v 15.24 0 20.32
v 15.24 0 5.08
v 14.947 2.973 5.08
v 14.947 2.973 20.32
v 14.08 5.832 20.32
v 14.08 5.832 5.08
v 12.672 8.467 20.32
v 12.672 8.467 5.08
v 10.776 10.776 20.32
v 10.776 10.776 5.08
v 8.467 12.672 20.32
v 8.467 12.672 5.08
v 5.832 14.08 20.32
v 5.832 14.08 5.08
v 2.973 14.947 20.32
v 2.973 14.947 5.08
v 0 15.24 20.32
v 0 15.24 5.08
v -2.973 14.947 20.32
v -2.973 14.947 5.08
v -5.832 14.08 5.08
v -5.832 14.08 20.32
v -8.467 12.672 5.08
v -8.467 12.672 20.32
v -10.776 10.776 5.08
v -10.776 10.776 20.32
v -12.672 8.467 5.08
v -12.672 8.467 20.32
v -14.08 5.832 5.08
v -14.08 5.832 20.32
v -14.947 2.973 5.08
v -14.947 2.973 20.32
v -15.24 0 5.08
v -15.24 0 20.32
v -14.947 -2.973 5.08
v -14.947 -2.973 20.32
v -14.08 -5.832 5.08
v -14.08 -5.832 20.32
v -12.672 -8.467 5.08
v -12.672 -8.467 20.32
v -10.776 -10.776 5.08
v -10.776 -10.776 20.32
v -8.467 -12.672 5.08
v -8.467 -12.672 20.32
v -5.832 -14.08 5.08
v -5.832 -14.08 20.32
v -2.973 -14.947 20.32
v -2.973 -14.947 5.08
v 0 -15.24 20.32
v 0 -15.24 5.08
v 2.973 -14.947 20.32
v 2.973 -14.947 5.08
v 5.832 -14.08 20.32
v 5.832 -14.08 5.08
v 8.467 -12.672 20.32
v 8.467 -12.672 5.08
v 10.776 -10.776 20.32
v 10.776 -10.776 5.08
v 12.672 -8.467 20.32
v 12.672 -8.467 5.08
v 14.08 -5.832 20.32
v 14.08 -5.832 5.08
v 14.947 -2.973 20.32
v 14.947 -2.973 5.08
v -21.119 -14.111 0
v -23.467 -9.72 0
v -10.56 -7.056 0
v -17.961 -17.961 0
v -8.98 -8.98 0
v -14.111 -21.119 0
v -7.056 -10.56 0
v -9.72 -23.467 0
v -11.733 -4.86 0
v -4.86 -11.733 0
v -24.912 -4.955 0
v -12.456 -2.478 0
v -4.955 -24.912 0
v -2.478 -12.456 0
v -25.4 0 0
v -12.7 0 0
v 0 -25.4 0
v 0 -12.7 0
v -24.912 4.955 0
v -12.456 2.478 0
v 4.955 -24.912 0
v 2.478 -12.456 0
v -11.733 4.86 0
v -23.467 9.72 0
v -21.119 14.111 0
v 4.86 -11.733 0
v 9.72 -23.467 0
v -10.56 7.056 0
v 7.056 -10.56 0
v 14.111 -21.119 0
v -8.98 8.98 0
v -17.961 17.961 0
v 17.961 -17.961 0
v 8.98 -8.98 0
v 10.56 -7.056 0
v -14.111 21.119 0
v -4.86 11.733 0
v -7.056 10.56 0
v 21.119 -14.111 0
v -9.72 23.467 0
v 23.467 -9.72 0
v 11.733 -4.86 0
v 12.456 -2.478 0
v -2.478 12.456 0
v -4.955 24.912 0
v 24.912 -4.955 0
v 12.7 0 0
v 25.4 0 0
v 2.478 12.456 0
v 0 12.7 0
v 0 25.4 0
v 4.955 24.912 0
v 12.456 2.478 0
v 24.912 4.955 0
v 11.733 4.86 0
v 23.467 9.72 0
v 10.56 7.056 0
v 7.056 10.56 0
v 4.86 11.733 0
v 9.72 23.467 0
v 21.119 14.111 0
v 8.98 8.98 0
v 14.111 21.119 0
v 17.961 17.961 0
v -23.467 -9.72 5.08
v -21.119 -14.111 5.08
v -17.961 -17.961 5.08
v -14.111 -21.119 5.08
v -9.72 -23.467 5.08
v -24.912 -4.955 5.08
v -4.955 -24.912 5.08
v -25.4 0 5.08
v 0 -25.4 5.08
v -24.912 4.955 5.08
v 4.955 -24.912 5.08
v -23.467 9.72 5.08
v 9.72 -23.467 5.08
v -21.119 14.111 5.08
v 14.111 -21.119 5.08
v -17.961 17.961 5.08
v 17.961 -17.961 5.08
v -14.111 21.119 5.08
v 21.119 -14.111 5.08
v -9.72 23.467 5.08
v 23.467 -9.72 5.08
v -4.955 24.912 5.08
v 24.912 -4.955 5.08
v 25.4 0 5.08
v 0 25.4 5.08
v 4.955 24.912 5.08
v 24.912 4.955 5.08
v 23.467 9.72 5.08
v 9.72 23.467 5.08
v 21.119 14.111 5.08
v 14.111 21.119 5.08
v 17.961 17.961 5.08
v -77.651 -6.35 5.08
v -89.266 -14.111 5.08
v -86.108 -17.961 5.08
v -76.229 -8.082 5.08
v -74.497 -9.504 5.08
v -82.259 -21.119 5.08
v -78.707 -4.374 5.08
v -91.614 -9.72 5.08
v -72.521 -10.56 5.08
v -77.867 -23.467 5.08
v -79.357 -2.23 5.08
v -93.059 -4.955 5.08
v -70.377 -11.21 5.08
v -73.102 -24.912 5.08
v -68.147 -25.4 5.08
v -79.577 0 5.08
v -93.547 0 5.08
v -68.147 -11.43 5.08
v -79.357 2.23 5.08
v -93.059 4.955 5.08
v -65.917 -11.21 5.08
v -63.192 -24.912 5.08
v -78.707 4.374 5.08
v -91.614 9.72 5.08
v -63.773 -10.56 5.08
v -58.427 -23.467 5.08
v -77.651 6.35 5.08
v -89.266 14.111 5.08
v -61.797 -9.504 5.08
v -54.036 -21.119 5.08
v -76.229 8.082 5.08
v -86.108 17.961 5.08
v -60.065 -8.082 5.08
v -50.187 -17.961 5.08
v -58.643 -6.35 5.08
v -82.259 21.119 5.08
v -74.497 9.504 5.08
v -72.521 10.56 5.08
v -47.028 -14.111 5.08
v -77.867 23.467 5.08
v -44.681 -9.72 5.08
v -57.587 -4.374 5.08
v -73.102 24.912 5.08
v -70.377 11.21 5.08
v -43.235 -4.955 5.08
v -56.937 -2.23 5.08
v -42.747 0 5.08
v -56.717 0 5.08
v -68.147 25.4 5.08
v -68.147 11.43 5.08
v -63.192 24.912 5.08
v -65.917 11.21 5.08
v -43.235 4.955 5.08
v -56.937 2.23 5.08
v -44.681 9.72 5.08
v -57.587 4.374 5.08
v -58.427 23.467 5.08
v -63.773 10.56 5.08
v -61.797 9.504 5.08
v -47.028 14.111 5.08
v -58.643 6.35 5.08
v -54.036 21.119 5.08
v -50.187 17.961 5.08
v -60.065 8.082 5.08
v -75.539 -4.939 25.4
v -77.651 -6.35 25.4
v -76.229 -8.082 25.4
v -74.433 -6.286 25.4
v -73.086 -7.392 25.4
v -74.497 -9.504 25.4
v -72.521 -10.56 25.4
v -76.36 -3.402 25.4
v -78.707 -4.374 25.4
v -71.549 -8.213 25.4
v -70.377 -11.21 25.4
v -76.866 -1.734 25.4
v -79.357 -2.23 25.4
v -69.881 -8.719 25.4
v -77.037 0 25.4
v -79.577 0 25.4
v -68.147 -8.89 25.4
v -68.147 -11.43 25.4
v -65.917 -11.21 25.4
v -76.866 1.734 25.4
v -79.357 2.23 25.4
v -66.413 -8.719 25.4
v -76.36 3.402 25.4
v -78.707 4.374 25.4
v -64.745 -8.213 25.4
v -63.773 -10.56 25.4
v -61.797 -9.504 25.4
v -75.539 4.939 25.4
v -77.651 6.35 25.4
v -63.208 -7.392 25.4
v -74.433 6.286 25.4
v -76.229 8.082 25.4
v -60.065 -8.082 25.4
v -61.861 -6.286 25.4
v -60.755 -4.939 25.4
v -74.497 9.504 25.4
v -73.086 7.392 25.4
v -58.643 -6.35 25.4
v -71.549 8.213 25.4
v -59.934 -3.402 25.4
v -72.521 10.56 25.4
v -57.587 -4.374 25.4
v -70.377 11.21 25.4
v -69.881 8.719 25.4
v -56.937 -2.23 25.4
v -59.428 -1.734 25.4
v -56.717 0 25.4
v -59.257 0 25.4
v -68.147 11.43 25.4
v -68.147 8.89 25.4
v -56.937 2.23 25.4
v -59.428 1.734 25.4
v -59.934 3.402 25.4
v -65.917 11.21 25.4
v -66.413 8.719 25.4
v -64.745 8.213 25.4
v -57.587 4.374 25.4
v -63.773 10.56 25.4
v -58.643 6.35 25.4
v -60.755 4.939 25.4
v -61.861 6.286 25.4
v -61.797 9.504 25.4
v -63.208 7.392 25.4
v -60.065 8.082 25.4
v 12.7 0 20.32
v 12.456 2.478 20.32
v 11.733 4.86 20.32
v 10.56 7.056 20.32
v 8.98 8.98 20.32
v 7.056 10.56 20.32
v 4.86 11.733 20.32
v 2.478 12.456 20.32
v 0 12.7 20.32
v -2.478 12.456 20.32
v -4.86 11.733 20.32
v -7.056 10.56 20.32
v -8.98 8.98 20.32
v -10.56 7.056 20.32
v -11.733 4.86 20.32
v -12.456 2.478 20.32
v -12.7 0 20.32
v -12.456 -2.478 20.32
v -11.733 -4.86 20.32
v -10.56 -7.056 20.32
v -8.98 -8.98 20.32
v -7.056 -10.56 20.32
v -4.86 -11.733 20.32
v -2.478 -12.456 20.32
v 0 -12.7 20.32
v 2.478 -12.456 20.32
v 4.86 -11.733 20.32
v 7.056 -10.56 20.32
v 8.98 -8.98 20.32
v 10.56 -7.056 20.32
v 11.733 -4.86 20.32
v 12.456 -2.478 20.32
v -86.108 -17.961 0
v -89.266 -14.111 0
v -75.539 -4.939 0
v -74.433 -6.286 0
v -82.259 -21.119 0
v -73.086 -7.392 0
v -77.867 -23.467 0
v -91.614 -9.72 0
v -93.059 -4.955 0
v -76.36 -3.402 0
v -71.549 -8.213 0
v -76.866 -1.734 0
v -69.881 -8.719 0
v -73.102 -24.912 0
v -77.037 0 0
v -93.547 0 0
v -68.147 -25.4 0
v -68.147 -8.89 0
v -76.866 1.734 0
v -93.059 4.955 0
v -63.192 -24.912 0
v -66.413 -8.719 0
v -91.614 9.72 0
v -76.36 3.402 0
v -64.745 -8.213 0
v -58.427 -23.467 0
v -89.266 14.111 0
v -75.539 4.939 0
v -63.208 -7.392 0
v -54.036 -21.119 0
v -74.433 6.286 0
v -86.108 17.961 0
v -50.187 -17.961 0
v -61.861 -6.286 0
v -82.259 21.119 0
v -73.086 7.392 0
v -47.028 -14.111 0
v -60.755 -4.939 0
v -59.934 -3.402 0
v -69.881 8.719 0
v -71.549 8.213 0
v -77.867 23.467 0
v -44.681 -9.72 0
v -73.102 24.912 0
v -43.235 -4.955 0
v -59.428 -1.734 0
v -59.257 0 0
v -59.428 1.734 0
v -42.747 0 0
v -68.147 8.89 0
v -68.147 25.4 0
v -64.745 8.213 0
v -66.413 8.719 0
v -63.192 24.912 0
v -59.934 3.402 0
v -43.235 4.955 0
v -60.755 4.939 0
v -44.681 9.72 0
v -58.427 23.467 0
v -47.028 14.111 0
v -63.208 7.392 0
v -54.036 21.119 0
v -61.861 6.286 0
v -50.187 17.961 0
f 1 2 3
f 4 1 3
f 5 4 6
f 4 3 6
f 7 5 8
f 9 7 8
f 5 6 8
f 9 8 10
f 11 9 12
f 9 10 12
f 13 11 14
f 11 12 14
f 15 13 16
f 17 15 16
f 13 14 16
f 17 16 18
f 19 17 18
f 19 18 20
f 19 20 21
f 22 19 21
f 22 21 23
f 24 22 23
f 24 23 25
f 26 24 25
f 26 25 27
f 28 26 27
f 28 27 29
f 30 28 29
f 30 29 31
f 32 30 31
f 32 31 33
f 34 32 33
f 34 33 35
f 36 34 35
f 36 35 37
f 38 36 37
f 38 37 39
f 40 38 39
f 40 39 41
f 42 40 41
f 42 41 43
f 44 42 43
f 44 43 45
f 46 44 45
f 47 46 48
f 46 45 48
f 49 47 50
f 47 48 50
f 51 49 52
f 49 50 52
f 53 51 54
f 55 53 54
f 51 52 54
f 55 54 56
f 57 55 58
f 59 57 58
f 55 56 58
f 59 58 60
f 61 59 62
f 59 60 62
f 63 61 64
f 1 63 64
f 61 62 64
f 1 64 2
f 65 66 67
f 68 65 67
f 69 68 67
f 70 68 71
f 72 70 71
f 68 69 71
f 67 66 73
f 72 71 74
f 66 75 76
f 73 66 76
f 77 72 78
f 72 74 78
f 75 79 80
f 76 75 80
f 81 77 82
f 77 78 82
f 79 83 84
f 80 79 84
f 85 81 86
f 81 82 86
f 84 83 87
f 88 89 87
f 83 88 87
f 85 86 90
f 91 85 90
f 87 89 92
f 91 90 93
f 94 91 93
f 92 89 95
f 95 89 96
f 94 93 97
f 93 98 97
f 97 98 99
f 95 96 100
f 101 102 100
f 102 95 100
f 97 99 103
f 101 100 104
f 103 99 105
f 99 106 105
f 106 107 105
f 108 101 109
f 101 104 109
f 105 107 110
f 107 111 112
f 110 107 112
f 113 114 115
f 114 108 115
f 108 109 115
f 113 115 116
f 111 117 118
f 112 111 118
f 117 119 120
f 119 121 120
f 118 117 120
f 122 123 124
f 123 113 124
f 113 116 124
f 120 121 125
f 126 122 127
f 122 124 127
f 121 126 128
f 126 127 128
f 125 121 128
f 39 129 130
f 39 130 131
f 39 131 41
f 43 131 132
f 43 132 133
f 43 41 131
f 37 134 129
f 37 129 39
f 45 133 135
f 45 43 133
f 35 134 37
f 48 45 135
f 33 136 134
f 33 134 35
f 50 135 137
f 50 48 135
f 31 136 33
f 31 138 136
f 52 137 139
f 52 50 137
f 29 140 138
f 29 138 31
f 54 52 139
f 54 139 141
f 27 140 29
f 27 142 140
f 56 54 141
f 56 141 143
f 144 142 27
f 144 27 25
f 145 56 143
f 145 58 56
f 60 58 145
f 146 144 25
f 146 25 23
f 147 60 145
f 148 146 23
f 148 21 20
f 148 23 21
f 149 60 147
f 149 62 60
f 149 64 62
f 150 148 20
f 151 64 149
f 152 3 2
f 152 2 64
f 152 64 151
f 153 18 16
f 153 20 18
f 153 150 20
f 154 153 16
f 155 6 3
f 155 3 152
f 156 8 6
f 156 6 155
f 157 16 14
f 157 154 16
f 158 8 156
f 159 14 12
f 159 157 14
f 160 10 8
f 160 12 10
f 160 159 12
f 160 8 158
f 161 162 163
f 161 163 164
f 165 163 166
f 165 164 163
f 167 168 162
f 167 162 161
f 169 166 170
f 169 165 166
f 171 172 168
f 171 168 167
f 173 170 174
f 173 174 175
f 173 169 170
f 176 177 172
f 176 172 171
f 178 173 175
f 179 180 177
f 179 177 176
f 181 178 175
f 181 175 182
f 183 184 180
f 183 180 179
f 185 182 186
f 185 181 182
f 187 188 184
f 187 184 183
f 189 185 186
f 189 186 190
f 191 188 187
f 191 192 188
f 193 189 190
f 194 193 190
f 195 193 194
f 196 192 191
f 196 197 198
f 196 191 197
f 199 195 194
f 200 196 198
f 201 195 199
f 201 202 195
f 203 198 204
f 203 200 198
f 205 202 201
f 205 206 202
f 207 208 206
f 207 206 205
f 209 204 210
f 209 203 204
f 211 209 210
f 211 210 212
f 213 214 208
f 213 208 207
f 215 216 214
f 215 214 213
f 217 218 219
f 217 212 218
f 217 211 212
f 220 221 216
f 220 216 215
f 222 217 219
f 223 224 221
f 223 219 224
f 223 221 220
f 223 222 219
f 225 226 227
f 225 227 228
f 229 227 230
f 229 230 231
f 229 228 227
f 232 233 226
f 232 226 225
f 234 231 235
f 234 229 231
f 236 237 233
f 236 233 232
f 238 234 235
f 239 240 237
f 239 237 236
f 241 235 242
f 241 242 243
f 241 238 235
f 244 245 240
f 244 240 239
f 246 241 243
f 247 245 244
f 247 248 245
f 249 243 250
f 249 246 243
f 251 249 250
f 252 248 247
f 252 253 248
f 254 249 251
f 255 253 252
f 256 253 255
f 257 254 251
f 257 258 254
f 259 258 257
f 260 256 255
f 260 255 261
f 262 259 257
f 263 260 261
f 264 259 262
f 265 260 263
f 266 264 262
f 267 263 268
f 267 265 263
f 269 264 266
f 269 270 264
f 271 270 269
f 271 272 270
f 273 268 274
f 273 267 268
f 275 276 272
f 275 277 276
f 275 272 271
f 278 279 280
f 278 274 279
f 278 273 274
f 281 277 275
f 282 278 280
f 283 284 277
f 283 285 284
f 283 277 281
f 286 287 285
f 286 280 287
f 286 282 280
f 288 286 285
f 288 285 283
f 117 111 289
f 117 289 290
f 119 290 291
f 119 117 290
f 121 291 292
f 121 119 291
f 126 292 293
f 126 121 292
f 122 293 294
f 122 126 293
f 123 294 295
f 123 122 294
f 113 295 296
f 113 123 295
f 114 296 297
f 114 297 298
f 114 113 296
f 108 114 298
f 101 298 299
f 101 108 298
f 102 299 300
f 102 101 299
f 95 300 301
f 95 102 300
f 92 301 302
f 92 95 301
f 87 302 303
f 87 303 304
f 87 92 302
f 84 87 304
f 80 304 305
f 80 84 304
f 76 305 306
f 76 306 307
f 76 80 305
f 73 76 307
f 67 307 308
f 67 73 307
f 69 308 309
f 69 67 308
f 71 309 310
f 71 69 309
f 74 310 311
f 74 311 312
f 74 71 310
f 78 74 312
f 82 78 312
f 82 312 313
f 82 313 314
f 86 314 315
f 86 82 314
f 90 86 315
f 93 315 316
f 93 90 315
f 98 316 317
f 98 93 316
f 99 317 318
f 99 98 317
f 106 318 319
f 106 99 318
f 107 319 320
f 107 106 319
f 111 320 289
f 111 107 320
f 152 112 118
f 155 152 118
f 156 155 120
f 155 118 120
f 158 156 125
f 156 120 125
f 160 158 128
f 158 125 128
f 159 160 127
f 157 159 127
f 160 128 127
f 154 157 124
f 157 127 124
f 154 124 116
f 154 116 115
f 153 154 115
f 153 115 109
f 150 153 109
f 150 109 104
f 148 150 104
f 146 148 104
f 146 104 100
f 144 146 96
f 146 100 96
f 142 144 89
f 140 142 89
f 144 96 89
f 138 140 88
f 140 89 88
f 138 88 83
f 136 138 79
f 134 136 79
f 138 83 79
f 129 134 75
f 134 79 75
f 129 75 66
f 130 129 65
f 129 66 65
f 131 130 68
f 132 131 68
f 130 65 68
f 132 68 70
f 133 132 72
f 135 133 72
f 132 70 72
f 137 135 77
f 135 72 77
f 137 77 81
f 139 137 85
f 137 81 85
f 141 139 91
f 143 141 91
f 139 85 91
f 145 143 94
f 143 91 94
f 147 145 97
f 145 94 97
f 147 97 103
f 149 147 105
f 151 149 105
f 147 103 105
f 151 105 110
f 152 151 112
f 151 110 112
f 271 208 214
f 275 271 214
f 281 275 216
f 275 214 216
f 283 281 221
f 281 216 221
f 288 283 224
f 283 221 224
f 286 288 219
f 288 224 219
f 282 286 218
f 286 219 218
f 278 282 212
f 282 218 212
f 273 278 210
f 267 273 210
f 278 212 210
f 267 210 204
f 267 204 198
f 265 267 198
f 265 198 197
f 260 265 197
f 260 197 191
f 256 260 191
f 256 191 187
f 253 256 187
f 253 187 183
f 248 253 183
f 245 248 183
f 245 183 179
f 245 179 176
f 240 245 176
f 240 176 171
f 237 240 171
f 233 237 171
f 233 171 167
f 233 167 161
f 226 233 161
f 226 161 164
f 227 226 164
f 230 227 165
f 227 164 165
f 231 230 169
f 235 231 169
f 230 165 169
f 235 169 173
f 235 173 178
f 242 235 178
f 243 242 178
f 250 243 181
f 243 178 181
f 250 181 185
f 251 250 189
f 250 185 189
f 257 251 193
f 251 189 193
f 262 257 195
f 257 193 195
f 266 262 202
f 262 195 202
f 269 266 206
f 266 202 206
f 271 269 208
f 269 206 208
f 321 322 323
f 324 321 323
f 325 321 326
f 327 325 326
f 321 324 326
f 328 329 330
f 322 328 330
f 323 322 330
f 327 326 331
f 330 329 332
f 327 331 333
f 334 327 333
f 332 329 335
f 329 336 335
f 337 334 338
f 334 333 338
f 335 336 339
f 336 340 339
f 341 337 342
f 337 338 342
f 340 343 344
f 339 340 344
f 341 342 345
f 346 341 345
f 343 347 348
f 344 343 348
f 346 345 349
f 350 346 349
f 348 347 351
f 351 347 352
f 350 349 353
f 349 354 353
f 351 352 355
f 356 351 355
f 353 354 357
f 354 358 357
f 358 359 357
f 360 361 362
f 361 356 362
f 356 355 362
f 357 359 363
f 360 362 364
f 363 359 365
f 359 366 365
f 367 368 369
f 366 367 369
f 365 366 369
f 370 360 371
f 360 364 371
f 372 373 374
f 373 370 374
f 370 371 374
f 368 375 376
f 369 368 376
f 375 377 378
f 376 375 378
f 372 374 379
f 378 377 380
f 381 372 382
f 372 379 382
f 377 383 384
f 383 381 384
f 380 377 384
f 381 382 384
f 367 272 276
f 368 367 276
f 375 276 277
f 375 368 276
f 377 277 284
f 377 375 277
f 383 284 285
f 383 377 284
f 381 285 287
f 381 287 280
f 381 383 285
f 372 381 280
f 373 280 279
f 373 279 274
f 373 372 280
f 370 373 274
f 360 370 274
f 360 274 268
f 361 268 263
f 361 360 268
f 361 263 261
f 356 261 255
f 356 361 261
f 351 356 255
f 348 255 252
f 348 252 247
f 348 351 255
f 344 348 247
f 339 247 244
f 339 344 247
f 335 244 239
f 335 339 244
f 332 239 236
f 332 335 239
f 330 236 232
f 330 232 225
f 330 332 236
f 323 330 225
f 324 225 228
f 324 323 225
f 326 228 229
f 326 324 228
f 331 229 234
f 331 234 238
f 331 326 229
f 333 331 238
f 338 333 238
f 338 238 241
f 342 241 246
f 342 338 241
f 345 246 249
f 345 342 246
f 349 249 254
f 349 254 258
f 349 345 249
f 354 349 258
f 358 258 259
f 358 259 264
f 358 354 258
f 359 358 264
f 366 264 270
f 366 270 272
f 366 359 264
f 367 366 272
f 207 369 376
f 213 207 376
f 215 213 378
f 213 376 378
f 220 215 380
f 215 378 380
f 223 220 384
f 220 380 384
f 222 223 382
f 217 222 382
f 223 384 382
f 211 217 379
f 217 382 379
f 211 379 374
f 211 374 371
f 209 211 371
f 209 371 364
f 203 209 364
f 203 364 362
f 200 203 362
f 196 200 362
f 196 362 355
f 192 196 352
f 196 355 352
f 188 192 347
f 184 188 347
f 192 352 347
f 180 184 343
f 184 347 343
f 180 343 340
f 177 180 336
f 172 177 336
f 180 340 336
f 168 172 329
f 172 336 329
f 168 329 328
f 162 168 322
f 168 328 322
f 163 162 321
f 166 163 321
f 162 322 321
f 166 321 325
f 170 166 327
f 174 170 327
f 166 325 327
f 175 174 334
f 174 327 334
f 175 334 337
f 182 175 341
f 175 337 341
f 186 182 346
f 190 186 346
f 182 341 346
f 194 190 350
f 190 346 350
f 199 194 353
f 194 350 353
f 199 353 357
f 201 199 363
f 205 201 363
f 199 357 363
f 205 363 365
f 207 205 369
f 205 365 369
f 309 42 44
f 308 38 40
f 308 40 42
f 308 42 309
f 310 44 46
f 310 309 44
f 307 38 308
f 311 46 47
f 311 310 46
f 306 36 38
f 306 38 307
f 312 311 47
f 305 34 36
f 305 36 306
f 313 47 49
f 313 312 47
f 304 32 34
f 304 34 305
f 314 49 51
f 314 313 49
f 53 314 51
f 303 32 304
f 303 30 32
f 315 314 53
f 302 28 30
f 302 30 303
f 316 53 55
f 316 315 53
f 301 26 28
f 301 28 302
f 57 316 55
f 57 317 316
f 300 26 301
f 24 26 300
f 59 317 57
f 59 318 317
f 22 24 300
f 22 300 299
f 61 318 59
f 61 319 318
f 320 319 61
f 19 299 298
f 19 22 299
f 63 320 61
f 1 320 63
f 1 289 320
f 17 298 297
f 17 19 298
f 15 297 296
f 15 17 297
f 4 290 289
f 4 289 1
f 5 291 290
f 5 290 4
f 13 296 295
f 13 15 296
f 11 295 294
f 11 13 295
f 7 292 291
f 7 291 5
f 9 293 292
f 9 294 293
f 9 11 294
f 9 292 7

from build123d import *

# Parameters (mm, degrees)
F0_R     = 25.4
F0_R_2   = 15.24
F1_DEPTH = 5.08
F0_R_3   = 12.7
F2_DEPTH = 20.32
F3_R     = 25.4
F3_R_2   = 11.43
F4_DEPTH = 5.08
F3_R_3   = 8.89
F5_DEPTH = 25.4


with BuildPart() as f1:
    # F0 (on Top) → F1 (new body)
    with BuildSketch(Plane.XY):
        Circle(F0_R)
        Circle(F0_R_2, mode=Mode.SUBTRACT)
    extrude(amount=F1_DEPTH)

    # F0 (on Top) → F2 (join)
    with BuildSketch(Plane.XY):
        Circle(F0_R_2)
        Circle(F0_R_3, mode=Mode.SUBTRACT)
    extrude(amount=F2_DEPTH)


with BuildPart() as f4:
    # F3 (on Top) → F4 (new body)
    with BuildSketch(Plane.XY):
        with Locations((-68.147062, 0)):
            Circle(F3_R)
        with Locations((-68.147062, 0)):
            Circle(F3_R_2, mode=Mode.SUBTRACT)
    extrude(amount=F4_DEPTH)

    # F3 (on Top) → F5 (join)
    with BuildSketch(Plane.XY):
        with Locations((-68.147062, 0)):
            Circle(F3_R_2)
        with Locations((-68.147062, 0)):
            Circle(F3_R_3, mode=Mode.SUBTRACT)
    extrude(amount=F5_DEPTH)


solid = Compound([f1.part, f4.part])
